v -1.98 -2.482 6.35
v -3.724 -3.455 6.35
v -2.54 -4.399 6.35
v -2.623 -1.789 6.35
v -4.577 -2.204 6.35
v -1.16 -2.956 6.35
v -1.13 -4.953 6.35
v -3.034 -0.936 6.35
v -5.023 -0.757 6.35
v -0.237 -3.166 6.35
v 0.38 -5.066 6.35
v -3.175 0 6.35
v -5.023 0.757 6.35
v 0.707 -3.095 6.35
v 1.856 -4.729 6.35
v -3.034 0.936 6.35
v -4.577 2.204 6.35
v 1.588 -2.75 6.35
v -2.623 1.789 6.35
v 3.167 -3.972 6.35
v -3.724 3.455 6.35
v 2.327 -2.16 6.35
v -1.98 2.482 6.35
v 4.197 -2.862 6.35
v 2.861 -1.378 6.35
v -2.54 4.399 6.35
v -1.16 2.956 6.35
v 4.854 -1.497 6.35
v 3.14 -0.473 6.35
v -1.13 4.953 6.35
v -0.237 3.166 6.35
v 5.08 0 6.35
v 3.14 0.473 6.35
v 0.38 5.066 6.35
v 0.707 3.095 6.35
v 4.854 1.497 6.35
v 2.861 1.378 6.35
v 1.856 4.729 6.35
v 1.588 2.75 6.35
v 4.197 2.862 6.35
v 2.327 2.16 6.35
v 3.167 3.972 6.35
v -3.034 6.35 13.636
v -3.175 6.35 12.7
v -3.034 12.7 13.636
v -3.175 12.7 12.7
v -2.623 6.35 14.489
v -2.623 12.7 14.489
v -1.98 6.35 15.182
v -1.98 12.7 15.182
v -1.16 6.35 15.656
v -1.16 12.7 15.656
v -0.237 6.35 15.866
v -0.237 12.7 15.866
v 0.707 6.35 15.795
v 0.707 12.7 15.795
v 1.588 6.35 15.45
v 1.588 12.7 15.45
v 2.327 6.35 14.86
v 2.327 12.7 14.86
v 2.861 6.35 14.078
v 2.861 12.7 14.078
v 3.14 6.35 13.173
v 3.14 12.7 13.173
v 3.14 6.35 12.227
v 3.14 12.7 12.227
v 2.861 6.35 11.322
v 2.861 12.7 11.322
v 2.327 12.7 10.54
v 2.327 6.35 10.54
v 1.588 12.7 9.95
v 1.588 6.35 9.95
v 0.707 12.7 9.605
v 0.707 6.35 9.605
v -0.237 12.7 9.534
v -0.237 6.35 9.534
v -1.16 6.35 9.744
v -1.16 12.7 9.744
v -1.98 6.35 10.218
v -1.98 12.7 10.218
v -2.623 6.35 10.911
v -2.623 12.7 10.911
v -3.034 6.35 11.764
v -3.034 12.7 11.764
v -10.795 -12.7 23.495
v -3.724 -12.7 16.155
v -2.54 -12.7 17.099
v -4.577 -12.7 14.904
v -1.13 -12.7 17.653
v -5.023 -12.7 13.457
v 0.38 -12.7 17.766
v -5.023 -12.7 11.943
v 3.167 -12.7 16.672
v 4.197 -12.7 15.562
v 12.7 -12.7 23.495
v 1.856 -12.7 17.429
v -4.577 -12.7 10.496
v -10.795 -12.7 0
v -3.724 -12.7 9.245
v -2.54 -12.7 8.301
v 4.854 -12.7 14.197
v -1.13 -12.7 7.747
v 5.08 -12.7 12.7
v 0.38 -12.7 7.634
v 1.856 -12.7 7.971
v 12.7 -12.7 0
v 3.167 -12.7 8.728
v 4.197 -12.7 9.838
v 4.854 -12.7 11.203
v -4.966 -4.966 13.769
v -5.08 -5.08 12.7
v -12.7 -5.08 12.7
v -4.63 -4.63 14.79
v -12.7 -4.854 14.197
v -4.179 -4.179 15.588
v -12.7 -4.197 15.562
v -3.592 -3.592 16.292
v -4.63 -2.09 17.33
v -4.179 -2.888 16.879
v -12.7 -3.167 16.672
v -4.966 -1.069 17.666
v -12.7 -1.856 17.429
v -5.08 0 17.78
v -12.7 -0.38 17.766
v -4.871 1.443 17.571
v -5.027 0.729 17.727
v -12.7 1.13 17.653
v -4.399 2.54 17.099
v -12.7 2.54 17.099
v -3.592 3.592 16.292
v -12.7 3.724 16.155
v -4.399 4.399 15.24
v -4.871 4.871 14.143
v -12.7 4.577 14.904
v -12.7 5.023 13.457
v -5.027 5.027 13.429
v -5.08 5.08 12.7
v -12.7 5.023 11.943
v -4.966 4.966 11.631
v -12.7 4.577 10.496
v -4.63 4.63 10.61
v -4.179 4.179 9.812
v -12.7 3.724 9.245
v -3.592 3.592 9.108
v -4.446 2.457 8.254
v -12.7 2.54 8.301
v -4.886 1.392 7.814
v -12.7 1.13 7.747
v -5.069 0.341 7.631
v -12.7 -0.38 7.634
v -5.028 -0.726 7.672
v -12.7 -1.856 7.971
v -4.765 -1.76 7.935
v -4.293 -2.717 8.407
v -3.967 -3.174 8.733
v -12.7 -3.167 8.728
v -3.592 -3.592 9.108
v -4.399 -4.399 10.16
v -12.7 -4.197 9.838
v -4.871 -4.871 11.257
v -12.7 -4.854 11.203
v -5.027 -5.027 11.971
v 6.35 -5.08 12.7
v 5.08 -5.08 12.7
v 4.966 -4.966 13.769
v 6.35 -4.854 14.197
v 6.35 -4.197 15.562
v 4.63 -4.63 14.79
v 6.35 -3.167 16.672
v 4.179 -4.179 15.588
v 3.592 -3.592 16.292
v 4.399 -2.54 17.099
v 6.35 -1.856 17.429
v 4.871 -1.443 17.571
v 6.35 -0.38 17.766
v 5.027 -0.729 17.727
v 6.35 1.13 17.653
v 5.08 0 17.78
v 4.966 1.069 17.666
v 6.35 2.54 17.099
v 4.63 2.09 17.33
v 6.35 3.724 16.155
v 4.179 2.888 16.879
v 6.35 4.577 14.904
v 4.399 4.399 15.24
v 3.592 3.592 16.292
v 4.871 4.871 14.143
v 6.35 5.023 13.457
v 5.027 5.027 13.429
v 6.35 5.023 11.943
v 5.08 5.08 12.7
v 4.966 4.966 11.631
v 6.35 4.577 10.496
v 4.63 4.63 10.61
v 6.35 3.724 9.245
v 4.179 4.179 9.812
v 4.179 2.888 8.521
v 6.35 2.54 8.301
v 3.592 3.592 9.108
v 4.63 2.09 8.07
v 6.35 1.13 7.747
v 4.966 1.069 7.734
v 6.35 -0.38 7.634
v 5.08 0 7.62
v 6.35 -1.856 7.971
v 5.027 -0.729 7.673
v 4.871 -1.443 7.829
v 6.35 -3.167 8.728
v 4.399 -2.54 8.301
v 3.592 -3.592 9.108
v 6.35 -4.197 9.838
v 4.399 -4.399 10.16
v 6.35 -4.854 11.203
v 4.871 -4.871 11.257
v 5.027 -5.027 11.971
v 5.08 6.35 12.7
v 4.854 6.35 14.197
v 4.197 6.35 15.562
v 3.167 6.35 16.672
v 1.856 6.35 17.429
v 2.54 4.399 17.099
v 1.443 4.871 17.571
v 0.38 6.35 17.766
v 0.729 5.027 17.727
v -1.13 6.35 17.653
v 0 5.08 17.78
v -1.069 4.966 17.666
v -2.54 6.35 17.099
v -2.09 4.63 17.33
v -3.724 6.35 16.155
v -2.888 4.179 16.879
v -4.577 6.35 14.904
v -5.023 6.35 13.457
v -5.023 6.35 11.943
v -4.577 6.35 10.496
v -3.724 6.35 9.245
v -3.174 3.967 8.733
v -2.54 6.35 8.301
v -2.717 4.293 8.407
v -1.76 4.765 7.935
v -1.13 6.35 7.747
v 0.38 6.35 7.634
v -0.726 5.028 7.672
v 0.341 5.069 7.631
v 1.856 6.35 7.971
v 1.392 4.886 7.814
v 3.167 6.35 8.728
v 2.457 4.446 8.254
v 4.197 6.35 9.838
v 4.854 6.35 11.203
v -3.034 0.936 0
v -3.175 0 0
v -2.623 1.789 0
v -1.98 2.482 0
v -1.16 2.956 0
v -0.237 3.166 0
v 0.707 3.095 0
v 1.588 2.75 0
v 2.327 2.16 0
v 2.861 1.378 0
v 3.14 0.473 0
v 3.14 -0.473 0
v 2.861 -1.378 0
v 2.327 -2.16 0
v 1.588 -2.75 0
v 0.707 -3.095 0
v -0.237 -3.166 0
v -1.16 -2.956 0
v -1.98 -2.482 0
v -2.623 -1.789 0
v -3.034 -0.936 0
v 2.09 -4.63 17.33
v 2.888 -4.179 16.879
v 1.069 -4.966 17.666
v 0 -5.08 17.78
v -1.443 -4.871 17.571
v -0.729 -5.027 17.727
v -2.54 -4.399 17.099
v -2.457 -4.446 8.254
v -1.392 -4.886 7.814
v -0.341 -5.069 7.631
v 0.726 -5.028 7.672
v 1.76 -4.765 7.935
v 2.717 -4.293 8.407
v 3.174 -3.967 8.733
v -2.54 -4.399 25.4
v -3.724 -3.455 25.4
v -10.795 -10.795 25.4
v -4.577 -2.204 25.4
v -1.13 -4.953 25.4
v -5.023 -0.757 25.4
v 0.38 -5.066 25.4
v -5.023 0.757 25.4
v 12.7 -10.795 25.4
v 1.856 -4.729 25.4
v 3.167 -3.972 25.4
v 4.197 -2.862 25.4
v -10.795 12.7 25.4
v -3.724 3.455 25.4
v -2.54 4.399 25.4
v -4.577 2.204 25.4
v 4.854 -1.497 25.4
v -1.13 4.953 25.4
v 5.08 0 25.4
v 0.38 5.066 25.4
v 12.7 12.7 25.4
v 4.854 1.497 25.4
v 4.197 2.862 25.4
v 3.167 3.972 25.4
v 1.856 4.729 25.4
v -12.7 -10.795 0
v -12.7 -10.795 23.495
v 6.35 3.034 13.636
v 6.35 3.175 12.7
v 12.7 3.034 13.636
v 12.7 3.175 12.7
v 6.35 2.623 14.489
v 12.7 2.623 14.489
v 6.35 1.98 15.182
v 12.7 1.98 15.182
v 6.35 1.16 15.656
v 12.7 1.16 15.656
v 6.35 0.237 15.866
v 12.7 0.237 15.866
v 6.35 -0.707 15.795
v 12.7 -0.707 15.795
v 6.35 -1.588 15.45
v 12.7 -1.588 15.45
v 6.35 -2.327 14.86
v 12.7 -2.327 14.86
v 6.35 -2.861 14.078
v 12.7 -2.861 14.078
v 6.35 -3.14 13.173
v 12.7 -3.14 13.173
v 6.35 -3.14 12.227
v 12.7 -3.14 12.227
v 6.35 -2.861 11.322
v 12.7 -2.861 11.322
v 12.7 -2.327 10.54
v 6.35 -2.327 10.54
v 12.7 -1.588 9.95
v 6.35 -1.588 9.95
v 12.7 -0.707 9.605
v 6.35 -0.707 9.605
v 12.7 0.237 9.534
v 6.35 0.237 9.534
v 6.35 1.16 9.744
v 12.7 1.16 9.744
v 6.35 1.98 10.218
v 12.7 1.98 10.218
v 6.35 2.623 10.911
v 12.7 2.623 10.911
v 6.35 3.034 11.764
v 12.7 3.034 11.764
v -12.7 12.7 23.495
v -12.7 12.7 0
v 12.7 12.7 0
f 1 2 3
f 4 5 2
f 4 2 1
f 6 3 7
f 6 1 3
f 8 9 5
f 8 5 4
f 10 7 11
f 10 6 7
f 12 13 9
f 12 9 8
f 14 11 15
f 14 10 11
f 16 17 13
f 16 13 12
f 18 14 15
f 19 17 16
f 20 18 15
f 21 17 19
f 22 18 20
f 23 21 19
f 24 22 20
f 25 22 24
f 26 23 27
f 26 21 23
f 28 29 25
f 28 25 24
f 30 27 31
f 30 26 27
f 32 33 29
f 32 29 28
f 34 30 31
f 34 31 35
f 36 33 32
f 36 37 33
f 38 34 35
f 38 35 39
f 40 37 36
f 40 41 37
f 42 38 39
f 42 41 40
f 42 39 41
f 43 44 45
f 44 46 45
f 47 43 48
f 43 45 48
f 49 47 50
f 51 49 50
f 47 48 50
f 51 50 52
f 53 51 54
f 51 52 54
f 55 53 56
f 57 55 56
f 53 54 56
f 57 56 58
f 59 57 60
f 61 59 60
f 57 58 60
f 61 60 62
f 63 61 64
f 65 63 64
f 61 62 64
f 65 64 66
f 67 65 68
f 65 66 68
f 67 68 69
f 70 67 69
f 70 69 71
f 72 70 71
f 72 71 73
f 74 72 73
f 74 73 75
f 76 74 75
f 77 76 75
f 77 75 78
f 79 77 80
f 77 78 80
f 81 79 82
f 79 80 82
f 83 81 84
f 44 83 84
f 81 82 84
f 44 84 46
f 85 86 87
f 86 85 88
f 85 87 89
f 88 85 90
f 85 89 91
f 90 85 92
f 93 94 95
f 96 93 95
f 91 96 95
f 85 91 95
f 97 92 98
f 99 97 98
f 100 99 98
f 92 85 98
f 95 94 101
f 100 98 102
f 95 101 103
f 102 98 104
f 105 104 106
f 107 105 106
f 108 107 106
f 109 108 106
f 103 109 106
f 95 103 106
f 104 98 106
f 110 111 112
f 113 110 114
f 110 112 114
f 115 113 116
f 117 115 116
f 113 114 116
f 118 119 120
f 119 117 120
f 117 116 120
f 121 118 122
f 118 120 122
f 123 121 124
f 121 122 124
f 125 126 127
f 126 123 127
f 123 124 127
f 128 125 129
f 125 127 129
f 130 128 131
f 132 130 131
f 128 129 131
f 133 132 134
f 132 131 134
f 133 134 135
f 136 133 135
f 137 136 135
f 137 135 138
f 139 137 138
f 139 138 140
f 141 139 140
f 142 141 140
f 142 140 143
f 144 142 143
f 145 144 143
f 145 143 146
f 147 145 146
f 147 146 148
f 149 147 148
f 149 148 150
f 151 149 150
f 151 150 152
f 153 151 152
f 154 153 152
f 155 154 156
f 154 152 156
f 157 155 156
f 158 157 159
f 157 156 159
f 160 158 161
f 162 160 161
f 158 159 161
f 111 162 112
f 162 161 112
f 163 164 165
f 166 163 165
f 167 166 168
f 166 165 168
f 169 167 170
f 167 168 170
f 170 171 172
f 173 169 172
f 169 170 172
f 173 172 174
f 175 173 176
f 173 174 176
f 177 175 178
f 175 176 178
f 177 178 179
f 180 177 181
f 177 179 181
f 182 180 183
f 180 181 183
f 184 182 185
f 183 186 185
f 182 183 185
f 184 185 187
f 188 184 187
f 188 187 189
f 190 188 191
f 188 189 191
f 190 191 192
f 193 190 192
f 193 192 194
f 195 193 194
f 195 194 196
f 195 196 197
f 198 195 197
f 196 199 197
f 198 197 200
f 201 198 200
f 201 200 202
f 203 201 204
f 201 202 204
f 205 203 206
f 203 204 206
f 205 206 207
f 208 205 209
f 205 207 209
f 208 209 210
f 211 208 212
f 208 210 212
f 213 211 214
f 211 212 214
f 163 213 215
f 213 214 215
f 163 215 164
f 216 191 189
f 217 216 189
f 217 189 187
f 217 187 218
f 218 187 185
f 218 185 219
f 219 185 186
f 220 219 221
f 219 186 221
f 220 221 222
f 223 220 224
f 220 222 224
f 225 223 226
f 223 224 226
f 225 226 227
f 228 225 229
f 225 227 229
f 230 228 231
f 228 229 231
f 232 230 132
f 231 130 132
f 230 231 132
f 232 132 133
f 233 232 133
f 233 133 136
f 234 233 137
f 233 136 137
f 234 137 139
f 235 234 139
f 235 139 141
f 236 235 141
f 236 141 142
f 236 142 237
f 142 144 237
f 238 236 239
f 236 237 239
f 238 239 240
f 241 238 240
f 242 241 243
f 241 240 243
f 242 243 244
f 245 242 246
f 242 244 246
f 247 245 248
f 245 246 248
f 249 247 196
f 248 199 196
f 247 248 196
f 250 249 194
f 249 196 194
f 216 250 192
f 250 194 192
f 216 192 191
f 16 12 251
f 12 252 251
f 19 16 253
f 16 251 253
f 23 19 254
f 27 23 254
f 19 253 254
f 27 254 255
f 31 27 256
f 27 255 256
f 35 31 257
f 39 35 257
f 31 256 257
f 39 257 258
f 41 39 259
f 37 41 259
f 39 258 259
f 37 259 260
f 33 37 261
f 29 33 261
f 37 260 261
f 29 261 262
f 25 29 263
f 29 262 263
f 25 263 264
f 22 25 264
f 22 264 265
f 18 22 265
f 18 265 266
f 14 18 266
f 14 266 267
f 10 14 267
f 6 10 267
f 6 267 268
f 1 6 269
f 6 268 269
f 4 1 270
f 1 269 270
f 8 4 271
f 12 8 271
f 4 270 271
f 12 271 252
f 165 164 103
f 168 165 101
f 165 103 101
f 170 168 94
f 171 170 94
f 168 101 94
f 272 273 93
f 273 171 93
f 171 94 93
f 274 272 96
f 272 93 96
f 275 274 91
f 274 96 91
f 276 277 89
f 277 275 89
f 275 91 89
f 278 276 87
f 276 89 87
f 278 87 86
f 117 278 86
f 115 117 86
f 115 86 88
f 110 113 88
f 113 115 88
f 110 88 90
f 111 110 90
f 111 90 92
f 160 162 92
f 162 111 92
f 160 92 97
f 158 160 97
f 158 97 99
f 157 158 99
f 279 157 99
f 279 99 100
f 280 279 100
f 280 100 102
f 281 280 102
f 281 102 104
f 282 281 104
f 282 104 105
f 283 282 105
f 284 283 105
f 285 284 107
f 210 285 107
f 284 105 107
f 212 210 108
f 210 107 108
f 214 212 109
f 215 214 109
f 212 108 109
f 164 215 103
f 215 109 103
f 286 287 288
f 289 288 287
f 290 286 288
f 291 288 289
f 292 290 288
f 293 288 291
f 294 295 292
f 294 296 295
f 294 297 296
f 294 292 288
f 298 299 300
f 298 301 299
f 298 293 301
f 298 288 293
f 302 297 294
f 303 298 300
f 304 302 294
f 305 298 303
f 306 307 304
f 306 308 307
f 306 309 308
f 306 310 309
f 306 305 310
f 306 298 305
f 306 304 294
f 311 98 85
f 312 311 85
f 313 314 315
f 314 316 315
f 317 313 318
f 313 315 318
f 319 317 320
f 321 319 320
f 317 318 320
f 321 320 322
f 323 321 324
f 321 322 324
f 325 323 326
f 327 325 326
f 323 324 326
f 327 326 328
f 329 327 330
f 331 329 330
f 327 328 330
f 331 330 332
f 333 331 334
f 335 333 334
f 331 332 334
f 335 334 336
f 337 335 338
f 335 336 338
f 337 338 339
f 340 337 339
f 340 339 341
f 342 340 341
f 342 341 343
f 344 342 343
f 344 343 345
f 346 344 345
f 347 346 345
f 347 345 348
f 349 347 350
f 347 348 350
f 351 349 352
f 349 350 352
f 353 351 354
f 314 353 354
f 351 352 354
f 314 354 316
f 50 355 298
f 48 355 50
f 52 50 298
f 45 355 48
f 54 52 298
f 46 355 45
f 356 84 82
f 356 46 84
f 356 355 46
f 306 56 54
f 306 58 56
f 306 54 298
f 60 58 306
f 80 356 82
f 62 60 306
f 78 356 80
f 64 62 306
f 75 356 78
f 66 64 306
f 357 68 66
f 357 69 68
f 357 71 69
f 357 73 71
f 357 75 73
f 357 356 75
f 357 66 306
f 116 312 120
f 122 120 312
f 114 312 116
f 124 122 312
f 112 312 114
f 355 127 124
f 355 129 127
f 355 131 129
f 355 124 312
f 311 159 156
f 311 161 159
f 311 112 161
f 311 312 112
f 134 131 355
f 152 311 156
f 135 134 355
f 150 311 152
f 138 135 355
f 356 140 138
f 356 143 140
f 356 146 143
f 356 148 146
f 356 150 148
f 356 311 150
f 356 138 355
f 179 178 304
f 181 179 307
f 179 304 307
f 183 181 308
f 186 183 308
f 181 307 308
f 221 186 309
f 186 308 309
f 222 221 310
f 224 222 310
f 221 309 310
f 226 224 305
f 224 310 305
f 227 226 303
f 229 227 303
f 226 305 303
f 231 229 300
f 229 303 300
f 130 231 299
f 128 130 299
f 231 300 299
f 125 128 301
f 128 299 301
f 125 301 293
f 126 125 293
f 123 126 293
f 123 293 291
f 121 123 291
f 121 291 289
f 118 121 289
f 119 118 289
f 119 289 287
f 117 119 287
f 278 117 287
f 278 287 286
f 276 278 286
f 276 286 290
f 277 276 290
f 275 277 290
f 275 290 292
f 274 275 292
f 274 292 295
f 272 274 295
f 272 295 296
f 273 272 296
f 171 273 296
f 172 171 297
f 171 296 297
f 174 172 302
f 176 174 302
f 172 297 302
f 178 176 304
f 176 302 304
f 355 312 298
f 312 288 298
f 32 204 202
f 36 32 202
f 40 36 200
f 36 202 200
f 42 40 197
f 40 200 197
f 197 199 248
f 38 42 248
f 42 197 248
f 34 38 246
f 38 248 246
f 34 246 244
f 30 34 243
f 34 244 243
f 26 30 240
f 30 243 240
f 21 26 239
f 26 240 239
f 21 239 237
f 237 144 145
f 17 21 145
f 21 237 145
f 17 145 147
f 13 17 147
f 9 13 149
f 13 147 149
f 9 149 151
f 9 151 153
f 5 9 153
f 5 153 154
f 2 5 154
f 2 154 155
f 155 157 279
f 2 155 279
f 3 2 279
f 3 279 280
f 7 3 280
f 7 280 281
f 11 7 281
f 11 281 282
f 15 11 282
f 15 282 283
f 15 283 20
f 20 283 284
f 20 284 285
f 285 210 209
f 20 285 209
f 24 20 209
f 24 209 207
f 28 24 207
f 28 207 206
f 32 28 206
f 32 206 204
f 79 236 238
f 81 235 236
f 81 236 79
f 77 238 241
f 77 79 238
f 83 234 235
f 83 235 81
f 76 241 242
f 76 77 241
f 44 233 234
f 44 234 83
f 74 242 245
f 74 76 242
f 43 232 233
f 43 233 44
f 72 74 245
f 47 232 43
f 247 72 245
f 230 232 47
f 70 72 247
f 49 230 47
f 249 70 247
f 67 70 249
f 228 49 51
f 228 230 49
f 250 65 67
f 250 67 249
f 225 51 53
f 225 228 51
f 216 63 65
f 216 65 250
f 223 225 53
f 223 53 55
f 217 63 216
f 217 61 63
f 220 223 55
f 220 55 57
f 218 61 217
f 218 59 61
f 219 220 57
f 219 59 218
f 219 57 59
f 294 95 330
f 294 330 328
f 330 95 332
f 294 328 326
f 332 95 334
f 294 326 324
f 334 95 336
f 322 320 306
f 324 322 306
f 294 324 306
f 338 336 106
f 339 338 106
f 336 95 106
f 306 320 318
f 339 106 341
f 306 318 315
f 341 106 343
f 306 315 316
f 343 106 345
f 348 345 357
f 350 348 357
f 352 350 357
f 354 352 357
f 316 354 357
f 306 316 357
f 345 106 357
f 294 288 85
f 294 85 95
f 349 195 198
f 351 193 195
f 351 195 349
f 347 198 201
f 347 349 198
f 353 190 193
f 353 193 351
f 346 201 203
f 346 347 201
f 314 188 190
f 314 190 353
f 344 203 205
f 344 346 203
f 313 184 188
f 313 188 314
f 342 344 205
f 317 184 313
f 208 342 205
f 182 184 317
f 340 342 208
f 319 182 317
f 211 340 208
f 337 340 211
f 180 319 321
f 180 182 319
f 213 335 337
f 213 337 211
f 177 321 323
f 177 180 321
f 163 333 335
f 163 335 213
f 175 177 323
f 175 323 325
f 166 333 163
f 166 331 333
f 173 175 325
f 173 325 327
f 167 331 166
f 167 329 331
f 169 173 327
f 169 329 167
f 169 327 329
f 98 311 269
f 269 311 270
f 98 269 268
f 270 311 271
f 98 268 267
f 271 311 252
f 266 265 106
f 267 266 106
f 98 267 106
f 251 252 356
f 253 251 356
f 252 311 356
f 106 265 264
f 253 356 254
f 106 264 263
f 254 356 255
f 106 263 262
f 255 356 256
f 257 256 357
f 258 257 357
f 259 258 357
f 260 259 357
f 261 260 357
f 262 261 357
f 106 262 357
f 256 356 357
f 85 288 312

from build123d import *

# Parameters (mm, degrees)
F0_W                 = 25.4
F0_H                 = 25.4
F1_DEPTH             = 25.4
F5_D                 = 6.35
F5_CBORE_D           = 10.16
F5_CBORE_DEPTH       = 19.05
F5_ON_F4_D           = 6.35
F5_ON_F4_CBORE_D     = 10.16
F5_ON_F4_CBORE_DEPTH = 19.05
F5_ON_F3_D           = 6.35
F5_ON_F3_CBORE_D     = 10.16
F5_ON_F3_CBORE_DEPTH = 19.05
F6_SIZE              = 1.905


with BuildPart() as f1:
    # F0 (on Top) → F1 (new body)
    with BuildSketch(Plane.XY):
        Rectangle(F0_W, F0_H)
    extrude(amount=F1_DEPTH)

    # F5 (through all)
    with Locations(Plane.XY.offset(25.4)):
        with Locations((0, 0)):
            CounterBoreHole(F5_D / 2, F5_CBORE_D / 2, F5_CBORE_DEPTH)

    # F5 on F4 (through all)
    with Locations(Plane(origin=(-12.7, 0, 0), x_dir=(0, -1, 0), z_dir=(-1, 0, 0))):
        with Locations((0, 12.7)):
            CounterBoreHole(F5_ON_F4_D / 2, F5_ON_F4_CBORE_D / 2, F5_ON_F4_CBORE_DEPTH)

    # F5 on F3 (through all)
    with Locations(Plane.XZ.offset(12.7)):
        with Locations((0, 12.7)):
            CounterBoreHole(F5_ON_F3_D / 2, F5_ON_F3_CBORE_D / 2, F5_ON_F3_CBORE_DEPTH)

    # F6
    f6_edges = [f1.edges().sort_by_distance(p)[0] for p in [
        (-12.7, 0, 25.4),
        (0, -12.7, 25.4),
        (-12.7, -12.7, 12.7),
    ]]
    chamfer(f6_edges, length=F6_SIZE)


solid = f1.part
